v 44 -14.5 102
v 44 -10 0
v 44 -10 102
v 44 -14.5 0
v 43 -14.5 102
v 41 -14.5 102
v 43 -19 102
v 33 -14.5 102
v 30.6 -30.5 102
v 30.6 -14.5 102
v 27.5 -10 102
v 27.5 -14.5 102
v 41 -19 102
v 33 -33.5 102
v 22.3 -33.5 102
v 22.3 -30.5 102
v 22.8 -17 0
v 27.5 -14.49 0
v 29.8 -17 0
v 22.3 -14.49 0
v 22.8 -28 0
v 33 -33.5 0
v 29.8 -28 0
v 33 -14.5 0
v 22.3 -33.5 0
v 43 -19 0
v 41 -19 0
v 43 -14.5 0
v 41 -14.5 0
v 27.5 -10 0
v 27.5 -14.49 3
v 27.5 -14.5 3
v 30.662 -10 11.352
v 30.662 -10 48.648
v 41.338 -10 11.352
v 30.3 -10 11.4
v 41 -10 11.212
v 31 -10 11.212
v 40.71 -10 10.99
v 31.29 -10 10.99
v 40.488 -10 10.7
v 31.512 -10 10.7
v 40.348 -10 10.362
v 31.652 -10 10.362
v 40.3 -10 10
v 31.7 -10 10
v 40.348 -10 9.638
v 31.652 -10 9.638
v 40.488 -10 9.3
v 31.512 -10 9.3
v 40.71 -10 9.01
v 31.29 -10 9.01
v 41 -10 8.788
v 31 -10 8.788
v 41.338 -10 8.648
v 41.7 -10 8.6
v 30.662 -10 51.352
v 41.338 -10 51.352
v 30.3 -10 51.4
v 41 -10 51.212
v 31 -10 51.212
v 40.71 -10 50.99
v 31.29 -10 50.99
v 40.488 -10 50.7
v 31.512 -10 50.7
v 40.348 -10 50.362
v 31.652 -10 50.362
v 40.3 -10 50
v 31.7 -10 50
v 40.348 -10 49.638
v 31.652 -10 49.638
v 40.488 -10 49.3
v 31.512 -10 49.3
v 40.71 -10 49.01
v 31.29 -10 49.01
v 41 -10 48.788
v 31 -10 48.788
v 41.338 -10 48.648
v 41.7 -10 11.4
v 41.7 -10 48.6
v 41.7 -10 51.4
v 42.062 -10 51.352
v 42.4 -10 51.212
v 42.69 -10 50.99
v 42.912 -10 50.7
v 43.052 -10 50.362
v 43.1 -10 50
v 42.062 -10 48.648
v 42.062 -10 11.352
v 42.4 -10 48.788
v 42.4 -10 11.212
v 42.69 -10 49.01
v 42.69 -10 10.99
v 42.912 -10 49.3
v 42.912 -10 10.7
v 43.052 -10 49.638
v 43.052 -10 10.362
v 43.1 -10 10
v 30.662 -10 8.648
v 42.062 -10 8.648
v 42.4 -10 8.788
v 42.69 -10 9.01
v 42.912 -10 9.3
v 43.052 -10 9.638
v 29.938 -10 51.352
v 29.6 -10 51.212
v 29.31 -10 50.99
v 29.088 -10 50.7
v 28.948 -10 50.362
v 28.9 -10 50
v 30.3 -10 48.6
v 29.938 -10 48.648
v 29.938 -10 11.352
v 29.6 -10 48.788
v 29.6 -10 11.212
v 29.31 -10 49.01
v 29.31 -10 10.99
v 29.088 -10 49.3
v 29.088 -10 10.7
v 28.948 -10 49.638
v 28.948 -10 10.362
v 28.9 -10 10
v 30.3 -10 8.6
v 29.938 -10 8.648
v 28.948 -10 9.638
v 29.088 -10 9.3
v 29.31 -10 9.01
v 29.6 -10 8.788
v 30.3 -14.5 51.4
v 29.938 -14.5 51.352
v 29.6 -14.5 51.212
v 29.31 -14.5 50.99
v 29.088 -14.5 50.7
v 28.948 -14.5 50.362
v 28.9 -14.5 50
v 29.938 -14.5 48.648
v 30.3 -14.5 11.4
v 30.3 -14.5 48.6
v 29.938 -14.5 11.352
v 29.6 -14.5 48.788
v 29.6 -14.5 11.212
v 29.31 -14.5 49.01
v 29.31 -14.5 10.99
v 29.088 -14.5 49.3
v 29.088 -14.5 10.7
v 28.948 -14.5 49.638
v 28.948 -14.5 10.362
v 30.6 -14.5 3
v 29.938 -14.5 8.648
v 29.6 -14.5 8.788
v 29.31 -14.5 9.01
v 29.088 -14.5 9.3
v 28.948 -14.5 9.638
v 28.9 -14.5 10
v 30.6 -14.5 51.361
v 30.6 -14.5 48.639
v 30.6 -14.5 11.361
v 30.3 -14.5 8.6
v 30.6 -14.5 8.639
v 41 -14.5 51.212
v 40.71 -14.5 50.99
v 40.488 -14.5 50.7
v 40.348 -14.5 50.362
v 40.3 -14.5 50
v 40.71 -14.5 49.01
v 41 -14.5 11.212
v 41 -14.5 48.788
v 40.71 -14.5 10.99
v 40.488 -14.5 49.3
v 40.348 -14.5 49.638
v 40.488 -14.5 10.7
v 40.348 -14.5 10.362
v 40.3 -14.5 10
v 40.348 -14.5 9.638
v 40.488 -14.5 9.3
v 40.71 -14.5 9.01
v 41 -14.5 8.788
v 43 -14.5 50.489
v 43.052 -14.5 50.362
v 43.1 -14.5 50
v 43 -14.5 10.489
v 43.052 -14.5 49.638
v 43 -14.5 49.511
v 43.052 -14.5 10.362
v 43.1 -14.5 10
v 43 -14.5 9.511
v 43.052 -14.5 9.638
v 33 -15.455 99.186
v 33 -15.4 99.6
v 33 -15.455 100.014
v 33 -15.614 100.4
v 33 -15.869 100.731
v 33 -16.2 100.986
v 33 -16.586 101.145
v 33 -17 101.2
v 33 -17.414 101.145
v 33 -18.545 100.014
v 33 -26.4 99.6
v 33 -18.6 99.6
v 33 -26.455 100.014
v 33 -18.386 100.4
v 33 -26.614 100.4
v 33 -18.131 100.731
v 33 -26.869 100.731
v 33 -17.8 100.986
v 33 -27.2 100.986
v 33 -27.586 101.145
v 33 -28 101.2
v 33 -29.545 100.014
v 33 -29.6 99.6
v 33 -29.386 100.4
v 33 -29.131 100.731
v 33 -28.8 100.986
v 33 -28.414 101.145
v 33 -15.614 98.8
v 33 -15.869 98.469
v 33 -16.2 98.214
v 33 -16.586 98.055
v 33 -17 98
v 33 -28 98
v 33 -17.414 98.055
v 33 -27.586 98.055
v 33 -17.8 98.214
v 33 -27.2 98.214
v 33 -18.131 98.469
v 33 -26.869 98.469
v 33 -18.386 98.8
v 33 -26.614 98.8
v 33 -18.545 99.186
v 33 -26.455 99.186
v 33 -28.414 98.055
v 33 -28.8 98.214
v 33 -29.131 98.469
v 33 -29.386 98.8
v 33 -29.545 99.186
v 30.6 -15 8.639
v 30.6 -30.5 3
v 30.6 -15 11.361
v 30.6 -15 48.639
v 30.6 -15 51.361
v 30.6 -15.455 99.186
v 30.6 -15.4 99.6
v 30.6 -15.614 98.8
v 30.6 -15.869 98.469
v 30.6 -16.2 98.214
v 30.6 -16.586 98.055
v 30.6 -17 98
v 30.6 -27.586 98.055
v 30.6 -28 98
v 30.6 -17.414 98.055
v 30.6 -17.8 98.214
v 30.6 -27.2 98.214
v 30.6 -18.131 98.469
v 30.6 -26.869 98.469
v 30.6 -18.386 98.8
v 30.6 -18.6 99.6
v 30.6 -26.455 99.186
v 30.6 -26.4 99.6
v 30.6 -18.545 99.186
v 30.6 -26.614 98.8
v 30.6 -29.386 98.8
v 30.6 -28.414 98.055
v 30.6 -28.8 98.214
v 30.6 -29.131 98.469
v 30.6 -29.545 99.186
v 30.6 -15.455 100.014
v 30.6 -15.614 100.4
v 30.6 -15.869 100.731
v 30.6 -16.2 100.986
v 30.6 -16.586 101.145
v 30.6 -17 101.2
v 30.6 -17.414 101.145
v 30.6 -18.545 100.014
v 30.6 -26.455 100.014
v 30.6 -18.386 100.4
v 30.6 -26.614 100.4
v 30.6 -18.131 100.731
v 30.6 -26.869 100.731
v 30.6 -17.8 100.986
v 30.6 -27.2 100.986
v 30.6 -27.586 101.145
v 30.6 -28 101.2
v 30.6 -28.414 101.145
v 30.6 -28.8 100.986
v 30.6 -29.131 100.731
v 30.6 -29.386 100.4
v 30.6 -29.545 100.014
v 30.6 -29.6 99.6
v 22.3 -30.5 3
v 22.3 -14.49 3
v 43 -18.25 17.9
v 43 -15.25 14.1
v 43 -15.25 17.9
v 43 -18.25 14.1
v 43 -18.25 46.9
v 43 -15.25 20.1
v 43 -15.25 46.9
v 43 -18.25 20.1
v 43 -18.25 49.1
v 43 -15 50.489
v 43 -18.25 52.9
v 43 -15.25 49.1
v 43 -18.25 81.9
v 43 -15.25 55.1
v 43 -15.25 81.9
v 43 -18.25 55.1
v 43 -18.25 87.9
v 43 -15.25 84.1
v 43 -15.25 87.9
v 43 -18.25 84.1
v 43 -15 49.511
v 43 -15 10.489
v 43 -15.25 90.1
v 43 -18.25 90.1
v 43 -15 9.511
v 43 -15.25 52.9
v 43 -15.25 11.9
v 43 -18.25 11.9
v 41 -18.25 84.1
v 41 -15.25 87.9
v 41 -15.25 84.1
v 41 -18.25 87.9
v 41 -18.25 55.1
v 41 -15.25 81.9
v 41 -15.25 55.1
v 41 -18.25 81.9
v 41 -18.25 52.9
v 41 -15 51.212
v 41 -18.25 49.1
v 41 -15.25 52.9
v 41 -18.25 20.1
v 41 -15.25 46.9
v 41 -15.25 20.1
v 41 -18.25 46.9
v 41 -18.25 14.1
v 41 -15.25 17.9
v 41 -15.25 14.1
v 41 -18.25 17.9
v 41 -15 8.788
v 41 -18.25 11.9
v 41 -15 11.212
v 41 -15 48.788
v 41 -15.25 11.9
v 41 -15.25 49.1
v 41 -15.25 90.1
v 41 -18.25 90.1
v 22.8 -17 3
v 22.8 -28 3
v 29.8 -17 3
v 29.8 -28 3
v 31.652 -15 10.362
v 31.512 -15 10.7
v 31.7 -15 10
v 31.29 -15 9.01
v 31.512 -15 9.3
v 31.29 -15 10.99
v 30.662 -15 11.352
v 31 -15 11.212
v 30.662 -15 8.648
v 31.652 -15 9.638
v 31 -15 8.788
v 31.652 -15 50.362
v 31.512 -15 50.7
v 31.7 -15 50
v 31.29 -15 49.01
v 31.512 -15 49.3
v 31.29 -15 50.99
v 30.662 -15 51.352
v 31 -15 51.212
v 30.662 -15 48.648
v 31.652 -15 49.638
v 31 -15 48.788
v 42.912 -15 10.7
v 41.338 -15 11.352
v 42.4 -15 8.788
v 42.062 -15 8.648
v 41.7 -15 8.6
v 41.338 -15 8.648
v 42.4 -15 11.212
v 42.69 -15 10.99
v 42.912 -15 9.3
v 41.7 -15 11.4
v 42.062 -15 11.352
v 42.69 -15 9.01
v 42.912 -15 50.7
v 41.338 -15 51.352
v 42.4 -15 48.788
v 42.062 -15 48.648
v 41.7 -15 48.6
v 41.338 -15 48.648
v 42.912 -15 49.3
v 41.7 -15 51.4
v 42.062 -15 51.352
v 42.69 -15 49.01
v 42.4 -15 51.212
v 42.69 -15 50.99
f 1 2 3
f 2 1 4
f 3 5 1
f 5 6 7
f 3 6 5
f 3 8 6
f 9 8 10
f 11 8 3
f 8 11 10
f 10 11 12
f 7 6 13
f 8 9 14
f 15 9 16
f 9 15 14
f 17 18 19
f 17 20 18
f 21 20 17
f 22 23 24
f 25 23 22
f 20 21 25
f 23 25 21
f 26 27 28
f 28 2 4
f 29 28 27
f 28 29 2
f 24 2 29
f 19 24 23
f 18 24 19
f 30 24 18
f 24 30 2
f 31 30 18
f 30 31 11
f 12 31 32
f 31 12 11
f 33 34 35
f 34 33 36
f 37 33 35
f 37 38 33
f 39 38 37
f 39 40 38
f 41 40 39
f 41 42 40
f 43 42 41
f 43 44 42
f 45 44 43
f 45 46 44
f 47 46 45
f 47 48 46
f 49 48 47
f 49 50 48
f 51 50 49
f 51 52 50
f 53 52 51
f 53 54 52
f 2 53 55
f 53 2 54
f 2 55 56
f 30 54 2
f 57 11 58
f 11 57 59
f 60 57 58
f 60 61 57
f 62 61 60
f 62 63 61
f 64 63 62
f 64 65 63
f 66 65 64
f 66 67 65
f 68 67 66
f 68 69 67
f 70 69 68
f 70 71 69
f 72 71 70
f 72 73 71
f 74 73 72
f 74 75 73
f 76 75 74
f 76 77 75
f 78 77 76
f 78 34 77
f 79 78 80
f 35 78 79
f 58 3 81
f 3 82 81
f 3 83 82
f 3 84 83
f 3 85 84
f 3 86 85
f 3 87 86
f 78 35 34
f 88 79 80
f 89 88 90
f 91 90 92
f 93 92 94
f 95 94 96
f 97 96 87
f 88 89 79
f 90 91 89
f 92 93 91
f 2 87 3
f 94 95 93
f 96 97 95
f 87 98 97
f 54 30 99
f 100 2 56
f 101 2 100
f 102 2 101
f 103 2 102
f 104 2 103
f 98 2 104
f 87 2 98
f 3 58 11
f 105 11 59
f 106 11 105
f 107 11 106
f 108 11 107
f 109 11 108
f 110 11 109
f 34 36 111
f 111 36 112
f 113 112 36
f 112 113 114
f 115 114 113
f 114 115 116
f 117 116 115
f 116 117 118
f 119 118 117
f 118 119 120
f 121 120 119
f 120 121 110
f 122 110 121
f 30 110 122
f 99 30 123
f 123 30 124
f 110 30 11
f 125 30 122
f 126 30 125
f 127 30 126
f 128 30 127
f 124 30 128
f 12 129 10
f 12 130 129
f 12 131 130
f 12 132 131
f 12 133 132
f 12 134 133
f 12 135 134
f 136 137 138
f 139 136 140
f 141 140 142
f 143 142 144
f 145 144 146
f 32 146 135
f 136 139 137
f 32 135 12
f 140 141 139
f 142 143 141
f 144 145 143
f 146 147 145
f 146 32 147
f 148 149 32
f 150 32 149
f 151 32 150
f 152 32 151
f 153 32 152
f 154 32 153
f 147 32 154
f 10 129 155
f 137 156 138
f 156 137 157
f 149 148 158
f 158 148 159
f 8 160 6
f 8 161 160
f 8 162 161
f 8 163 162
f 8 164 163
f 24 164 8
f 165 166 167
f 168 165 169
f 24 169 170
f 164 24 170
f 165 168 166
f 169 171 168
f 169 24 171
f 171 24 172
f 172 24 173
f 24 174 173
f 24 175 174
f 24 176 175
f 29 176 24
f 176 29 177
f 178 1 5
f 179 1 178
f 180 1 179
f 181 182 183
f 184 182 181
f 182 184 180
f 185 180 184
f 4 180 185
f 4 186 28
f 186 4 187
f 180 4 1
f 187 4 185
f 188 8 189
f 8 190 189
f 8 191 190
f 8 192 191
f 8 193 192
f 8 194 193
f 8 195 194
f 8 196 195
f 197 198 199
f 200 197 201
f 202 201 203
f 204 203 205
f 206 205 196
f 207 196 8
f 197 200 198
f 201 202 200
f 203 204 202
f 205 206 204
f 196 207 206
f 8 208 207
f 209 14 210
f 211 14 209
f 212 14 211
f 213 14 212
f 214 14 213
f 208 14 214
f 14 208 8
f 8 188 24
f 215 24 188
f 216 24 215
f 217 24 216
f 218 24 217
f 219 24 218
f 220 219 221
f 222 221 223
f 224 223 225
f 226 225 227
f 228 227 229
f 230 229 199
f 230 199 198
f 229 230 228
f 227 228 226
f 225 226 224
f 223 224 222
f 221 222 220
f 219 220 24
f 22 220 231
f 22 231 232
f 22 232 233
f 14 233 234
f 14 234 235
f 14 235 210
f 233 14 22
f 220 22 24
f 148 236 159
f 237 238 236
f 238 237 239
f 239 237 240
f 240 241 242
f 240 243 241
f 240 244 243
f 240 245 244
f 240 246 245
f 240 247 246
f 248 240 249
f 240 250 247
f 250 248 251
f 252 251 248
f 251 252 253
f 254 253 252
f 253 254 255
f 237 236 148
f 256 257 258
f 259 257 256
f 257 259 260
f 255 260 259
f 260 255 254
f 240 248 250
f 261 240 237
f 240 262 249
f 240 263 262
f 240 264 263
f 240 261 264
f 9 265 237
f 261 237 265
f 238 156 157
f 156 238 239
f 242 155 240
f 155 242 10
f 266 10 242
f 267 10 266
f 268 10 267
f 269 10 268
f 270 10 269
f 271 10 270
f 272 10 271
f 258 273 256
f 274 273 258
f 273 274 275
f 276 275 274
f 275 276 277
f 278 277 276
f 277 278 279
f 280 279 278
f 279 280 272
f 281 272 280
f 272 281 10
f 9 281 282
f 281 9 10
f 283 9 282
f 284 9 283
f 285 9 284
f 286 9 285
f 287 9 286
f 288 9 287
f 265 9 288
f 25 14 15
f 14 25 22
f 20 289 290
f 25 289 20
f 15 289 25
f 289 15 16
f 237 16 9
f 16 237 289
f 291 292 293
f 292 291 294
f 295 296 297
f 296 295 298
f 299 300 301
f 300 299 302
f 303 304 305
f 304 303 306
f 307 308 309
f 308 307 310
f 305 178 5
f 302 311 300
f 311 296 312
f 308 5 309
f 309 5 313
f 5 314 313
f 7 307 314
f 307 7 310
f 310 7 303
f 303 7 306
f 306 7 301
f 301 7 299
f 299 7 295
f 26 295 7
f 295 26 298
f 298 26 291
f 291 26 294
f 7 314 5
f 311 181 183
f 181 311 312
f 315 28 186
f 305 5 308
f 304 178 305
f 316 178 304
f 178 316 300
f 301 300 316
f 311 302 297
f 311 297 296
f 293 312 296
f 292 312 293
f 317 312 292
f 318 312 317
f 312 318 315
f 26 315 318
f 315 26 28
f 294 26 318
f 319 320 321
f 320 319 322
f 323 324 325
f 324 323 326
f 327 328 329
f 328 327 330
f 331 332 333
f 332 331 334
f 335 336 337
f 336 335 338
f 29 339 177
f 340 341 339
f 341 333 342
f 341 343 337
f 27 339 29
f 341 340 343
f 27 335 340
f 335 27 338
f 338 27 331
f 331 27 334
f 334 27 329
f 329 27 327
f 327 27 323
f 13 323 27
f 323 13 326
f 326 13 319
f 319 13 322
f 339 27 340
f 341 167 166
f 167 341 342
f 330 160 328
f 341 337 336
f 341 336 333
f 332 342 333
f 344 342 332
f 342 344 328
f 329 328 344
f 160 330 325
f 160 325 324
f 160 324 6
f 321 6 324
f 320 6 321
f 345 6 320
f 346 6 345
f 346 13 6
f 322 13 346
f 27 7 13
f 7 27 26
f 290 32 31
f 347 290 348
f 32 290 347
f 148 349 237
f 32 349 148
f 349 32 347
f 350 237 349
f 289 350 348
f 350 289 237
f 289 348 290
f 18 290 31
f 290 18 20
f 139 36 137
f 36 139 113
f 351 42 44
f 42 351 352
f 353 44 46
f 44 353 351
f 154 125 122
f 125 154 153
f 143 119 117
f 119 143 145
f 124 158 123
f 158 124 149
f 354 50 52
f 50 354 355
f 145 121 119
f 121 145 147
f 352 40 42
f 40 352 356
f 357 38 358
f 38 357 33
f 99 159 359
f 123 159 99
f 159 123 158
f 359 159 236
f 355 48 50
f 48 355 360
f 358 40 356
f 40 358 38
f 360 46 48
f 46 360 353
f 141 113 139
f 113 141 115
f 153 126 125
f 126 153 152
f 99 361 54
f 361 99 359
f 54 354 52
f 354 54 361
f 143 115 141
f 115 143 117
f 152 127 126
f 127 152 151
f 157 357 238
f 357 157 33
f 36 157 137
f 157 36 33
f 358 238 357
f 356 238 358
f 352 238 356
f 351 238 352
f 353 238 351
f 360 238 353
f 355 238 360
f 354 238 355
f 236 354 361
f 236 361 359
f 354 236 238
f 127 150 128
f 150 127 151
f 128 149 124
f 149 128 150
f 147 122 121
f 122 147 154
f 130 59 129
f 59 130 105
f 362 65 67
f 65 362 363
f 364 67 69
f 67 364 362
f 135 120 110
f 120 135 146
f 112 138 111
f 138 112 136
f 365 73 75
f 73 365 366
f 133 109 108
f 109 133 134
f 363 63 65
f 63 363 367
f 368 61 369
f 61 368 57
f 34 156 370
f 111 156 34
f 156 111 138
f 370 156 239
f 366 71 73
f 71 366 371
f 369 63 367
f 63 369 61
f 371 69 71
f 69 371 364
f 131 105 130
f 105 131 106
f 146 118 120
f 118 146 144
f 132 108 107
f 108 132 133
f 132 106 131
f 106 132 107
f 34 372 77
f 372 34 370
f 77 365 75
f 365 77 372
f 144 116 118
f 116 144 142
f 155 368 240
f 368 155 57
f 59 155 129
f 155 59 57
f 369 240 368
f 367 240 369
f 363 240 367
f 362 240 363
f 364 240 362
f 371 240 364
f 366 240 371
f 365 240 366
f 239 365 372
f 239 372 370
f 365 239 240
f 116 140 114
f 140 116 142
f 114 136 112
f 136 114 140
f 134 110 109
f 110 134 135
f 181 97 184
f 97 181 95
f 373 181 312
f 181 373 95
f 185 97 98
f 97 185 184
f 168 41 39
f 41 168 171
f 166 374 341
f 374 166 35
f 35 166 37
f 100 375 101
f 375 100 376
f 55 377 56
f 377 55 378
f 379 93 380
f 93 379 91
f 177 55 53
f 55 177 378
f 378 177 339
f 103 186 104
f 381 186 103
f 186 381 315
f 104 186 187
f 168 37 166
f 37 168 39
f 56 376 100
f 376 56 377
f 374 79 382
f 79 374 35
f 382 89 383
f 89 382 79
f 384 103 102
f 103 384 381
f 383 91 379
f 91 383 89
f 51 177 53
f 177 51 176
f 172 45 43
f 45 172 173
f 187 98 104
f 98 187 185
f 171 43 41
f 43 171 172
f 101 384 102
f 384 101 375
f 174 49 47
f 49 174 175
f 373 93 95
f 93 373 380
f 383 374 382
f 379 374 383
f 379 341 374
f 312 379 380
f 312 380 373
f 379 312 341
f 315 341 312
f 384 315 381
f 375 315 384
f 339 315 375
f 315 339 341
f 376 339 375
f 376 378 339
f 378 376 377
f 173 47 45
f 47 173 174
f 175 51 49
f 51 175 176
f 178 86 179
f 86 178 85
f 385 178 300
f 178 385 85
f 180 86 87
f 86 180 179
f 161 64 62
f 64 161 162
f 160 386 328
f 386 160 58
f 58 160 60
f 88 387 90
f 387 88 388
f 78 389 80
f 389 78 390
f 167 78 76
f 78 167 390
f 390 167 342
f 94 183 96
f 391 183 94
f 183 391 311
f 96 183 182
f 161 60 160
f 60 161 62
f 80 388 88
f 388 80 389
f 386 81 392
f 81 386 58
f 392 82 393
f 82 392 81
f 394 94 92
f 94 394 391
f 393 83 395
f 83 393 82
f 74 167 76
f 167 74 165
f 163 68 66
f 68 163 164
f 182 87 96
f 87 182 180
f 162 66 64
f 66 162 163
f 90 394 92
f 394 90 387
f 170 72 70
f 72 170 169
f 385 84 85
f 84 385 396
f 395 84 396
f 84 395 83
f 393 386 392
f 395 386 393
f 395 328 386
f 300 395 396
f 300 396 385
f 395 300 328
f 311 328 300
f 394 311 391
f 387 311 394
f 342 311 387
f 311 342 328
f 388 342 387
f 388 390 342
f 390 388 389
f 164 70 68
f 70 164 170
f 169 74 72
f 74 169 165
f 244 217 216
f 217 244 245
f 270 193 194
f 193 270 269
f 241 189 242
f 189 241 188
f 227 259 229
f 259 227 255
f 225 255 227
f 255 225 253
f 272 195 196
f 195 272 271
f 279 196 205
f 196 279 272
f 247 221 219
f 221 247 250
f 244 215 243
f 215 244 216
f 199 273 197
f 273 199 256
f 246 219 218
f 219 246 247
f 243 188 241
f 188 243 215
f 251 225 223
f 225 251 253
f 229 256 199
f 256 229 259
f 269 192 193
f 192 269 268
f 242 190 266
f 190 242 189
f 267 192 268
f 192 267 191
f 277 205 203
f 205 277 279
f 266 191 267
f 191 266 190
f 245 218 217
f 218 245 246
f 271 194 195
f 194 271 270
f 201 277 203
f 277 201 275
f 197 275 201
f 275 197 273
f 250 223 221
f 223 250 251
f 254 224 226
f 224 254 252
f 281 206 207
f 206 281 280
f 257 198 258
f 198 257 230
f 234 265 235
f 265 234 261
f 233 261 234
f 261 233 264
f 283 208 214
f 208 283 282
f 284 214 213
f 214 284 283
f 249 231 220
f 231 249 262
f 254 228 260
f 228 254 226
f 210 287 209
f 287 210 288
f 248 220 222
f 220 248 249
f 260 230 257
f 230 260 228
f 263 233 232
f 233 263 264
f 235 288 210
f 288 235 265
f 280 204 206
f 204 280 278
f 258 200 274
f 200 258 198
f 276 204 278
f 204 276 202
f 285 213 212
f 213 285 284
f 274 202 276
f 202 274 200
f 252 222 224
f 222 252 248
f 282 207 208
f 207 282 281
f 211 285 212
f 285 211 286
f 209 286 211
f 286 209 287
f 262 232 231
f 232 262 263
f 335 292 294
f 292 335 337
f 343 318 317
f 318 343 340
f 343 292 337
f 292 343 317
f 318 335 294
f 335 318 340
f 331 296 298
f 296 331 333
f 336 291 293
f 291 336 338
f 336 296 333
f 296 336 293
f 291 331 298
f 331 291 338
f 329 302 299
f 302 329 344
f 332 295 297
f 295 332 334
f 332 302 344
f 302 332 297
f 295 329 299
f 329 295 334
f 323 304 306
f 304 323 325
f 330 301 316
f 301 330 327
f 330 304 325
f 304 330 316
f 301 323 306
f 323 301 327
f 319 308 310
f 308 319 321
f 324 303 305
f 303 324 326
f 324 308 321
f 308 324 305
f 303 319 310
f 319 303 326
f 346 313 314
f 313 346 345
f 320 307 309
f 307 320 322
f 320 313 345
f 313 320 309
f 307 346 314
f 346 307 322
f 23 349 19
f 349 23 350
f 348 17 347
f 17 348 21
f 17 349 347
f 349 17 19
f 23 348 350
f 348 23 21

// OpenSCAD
// =====================================================================
// child_vtray_xt60_cradle.scad — 子機 縦置き内装 電池リード硬直部 (XT60) クレードル
//
// 電池 (lipo_35x26x110) の電源リードは「可撓 60mm → 硬直 50mm → XT60 プラグ」で、
// 硬直部と XT60 嵌合ペア (parts/child/interior/cots/xt60_rigid_run、8.2 x 15.6 x 95)
// は曲げられない。この直線 95mm を、デッキ下面の +X 側 (電池箱の外壁と
// アクリル内壁の間) に **Z 方向 (チューブ軸) に沿って** 収めるのがこの部品。
//
// 断面 (X 右 / Y 上 = デッキ側):
//
//     デッキ下面 y=-10 ─────────────────────────────────────
//     [電池箱の耳]  ┃   天板 (plate)  x 27.5..44                ┃
//     電池箱外壁    ┃ 硬直部ポケット ┃ 外壁 ┃ ハーネス溝 ┃ リップ ┃
//     x=22          ┃ x 22..30.6     ┃30.6..┃ 33..41     ┃41..43 ┃ y -19
//                   ┃ y -14.5..-30.5 ┃ 33   ┃(結束スロット付き)
//                   ┗━━━━ 棚 (ledge) y -30.5..-33.5 ━━┛
//
//   ・ポケットの −X 側の面は **電池箱の外壁 (x=22)** が受ける (この部品には無い)。
//   ・硬直部は上 (+Z) から RX 基板を付ける前に差し込み、下端タブ (tab) に載る。
//     上端は結束バンド 1 本 (外壁の Ø3.2 穴 2 個に通し、端面の前を横切らせる) で止める。
//   ・ハーネス溝: 旧 +X ケーブルレールの代わり。Ø6 までのケーブルをリップの
//     結束スロット (2 個 1 組) で結束する。
//   ・デッキへの固定は旧 +X レールと同じ 4 穴 (x 30.3 / 41.7, 世界 z 37 / 77) を使い、
//     デッキ上面から M3×8 で天板にセルフタップする (M3×10 だと先端がポケットに出る)。
//
// 座標: X, Y は child_vtray_deck と同じ世界座標。Z はこの部品の下端 (世界 z = cradle_z0) を 0。
//
// 印刷向き: **Z を上に立てて印刷** (下端タブがベッド)。板はすべて垂直でサポート不要。
//           足場が 22 x 24 mm で高さ 102 なので **ブリム 8mm 以上**。
// =====================================================================

/* [容器 (干渉検査用。deck と同じ値にすること)] */
tube_id    = 101.6;
wall_clear = 2.5;

/* [取合い (child_vtray_deck / child_vtray_batt_box と一致させること)] */
deck_y0    = -10;     // デッキ下面 Y
deck_t     = 4;       // デッキ板厚
box_out_x  = 22;      // 電池箱外壁の X (= ポケットの −X 面)
box_ear_x  = 27;      // 電池箱 +X 耳の外端 X
rail_hx    = [30.3, 41.7];  // デッキの旧レール用 Ø3.4 穴 X (deck: rail_x ± rail_hx)
rail_hz    = [37, 77];      // 同 世界 Z
cradle_z0  = 27;      // この部品の下端の世界 Z
rx_z0      = 134;     // RX 基板 (デッキ下面) の Z 始点
screw_l    = 8;       // 固定ねじ M3×8 (デッキ 4 + 天板 4)

/* [硬直部 (parts/child/interior/cots/xt60_rigid_run と一致させること)] */
run_w      = 8.2;     // X
run_h      = 15.6;    // Y
run_l      = 95;      // Z
run_clear  = 0.4;     // ポケットの遊び (X, Y とも)
gap_box    = 0.3;     // 電池箱外壁との隙間 (部品同士を密着させない)

/* [板厚] */
plate_t    = 4.5;     // 天板 (ねじが 4mm かかる)
owall_t    = 2.4;     // ポケット外壁
ledge_t    = 3;       // 棚
tab_t      = 3;       // 下端タブ (硬直部の軸方向の座)
lip_t      = 2;       // ハーネス溝の外リップ (X)
lip_h      = 4.5;     // 同 高さ (Y)
duct_w     = 8;       // ハーネス溝の幅 (X)
plate_x1   = 44;      // 天板の外端 X

/* [結束・ストッパ] */
tie_z      = [16, 51, 86];   // 結束スロット組の中心 Z (組内 2 個は tie_gap 離す)
tie_gap    = 6;
tie_slot_z = 2.2;
tie_slot_h = 3.0;     // Y 方向の長さ
stop_d     = 3.2;     // 上端ストッパ用 結束バンド穴Ø
stop_y     = [-17, -28];
notch_w    = 7;       // 下端タブの可撓リード通し (硬直部の下から出る 2 本)
notch_h    = 11;

$fn = 48;

// ---- 導出 -------------------------------------------------------------
r_use     = tube_id/2 - wall_clear;
pocket_x0 = box_out_x + gap_box;             // 22.3 (部品の −X 端)
pocket_x1 = box_out_x + run_w + run_clear;   // 30.6 (硬直部が入る幅は箱外壁から測る)
owall_x1  = pocket_x1 + owall_t;             // 33.0
duct_x1   = owall_x1 + duct_w;               // 41.0
lip_x1    = duct_x1 + lip_t;                 // 43.0
plate_x0  = box_ear_x + 0.5;                 // 27.5
plate_y1  = deck_y0 - plate_t;               // -14.5 (ポケット上面)
pocket_y1 = plate_y1 - (run_h + run_clear);  // -30.5 (棚上面)
ledge_y0  = pocket_y1 - ledge_t;             // -33.5
lip_y0    = plate_y1 - lip_h;                // -19
cradle_len = tab_t + run_l + 4;              // 102: タブ + 硬直部 + ストッパ帯
stop_z    = tab_t + run_l + 1.6;             // 結束バンド穴の Z (端面から 1mm 上)
run_center = [(box_out_x + pocket_x1)/2, (plate_y1 + pocket_y1)/2];   // 硬直部の中心 (26.3, -22.5)
screw_tip_y = deck_y0 - (screw_l - deck_t);  // M3×8 の先端 Y = -14

function rad(x, y) = sqrt(x*x + y*y);

// ---- 干渉・成立性チェック ---------------------------------------------
assert(rad(owall_x1, ledge_y0) <= r_use, str("棚の外側下角がチューブに接触 r=", rad(owall_x1, ledge_y0)));
assert(rad(lip_x1, lip_y0) <= r_use, str("ハーネス溝リップがチューブに接触 r=", rad(lip_x1, lip_y0)));
assert(rad(plate_x1, plate_y1) <= r_use, str("天板の外端がチューブに接触 r=", rad(plate_x1, plate_y1)));
assert(plate_x1 >= lip_x1, "天板がリップより短い");
assert(plate_x0 > box_ear_x, "天板が電池箱の耳に当たる");
assert(plate_x0 < pocket_x1 - 2, "天板が硬直部の上を 2mm 以上覆っていない (硬直部が上へ逃げる)");
// ねじ: 天板の中にあり、先端がポケットに出ないこと
for (x = rail_hx) {
    assert(x - 1.7 > plate_x0 && x + 1.7 < plate_x1, str("固定ねじ X=", x, " が天板の外"));
}
assert(screw_tip_y >= plate_y1, str("固定ねじ先端 y=", screw_tip_y, " がポケット (", plate_y1, ") に出る → 短いねじにする"));
for (z = rail_hz) assert(z - cradle_z0 > 3 && z - cradle_z0 < cradle_len - 3, str("固定ねじ Z=", z, " が部品の外"));
// 硬直部
assert(pocket_x1 - box_out_x >= run_w + run_clear - 0.01, "ポケット幅が硬直部より狭い");
assert(plate_y1 - pocket_y1 >= run_h + run_clear - 0.01, "ポケット高さが硬直部より低い");
assert(stop_z > tab_t + run_l + 0.5 && stop_z + stop_d/2 < cradle_len, "ストッパ穴が硬直部の端面に重なる/部品の外");
for (y = stop_y) assert(y - stop_d/2 > pocket_y1 && y + stop_d/2 < plate_y1, "ストッパ穴がポケットの外");
assert(cradle_z0 + cradle_len + 5 <= rx_z0, str("クレードル上端 ", cradle_z0 + cradle_len, " が RX 基板 ", rx_z0, " に近すぎる"));
// 結束スロットがリップの中に収まること
for (zc = tie_z) for (dz = [-tie_gap/2, tie_gap/2])
    assert(zc + dz - tie_slot_z/2 > tab_t && zc + dz + tie_slot_z/2 < cradle_len,
           str("結束スロット Z=", zc + dz, " がリップの外"));
assert(tie_slot_h < lip_h - 1, "結束スロットがリップより高い");
assert(notch_w < pocket_x1 - box_out_x - 1 && notch_h < plate_y1 - pocket_y1 - 2, "タブの切欠きが大きすぎる");

// ---- 本体 -------------------------------------------------------------
difference() {
    union() {
        // 天板 (デッキ下面に密着。ねじ受け)
        translate([plate_x0, plate_y1, 0]) cube([plate_x1 - plate_x0, plate_t, cradle_len]);
        // ポケット外壁
        translate([pocket_x1, ledge_y0, 0]) cube([owall_t, plate_y1 - ledge_y0, cradle_len]);
        // 棚 (硬直部の −Y 側の座。箱外壁の手前まで)
        translate([pocket_x0, ledge_y0, 0]) cube([owall_x1 - pocket_x0, ledge_t, cradle_len]);
        // ハーネス溝の外リップ
        translate([duct_x1, lip_y0, 0]) cube([lip_t, plate_y1 - lip_y0 + 0.01, cradle_len]);
        // 下端タブ (硬直部の座。ポケット断面を塞ぐ)
        translate([pocket_x0, pocket_y1, 0]) cube([owall_x1 - pocket_x0, plate_y1 - pocket_y1 + 0.01, tab_t]);
    }
    // 固定ねじ M3 セルフタップ下穴 (デッキ側から)
    for (x = rail_hx) for (z = rail_hz)
        translate([x, deck_y0 + 0.5, z - cradle_z0]) rotate([90, 0, 0]) cylinder(d = 2.8, h = plate_t + 1, $fn = 24);
    // 下端タブの可撓リード通し
    translate([run_center[0] - notch_w/2, run_center[1] - notch_h/2, -0.5]) cube([notch_w, notch_h, tab_t + 1]);
    // 上端ストッパ: 結束バンドを通す穴 ×2 (外壁を X 方向に貫通)
    for (y = stop_y)
        translate([pocket_x1 - 0.5, y, stop_z]) rotate([0, 90, 0]) cylinder(d = stop_d, h = owall_t + 1, $fn = 24);
    // ハーネス結束スロット (リップを X 方向に貫通、2 個 1 組)
    for (zc = tie_z) for (dz = [-tie_gap/2, tie_gap/2])
        translate([duct_x1 - 0.5, lip_y0 + 0.75, zc + dz - tie_slot_z/2])
            cube([lip_t + 1, tie_slot_h, tie_slot_z]);
}

echo(str("child_vtray_xt60_cradle: 世界 z ", cradle_z0, "..", cradle_z0 + cradle_len,
         " / ポケット x ", box_out_x, "..", pocket_x1, " y ", pocket_y1, "..", plate_y1,
         " (硬直部中心 ", run_center, ", 世界 z ", cradle_z0 + tab_t, "..", cradle_z0 + tab_t + run_l, ")",
         " / ハーネス溝 x ", owall_x1, "..", duct_x1,
         "  最小チューブすきま=", tube_id/2 - max(rad(owall_x1, ledge_y0), rad(lip_x1, lip_y0), rad(plate_x1, plate_y1))));
